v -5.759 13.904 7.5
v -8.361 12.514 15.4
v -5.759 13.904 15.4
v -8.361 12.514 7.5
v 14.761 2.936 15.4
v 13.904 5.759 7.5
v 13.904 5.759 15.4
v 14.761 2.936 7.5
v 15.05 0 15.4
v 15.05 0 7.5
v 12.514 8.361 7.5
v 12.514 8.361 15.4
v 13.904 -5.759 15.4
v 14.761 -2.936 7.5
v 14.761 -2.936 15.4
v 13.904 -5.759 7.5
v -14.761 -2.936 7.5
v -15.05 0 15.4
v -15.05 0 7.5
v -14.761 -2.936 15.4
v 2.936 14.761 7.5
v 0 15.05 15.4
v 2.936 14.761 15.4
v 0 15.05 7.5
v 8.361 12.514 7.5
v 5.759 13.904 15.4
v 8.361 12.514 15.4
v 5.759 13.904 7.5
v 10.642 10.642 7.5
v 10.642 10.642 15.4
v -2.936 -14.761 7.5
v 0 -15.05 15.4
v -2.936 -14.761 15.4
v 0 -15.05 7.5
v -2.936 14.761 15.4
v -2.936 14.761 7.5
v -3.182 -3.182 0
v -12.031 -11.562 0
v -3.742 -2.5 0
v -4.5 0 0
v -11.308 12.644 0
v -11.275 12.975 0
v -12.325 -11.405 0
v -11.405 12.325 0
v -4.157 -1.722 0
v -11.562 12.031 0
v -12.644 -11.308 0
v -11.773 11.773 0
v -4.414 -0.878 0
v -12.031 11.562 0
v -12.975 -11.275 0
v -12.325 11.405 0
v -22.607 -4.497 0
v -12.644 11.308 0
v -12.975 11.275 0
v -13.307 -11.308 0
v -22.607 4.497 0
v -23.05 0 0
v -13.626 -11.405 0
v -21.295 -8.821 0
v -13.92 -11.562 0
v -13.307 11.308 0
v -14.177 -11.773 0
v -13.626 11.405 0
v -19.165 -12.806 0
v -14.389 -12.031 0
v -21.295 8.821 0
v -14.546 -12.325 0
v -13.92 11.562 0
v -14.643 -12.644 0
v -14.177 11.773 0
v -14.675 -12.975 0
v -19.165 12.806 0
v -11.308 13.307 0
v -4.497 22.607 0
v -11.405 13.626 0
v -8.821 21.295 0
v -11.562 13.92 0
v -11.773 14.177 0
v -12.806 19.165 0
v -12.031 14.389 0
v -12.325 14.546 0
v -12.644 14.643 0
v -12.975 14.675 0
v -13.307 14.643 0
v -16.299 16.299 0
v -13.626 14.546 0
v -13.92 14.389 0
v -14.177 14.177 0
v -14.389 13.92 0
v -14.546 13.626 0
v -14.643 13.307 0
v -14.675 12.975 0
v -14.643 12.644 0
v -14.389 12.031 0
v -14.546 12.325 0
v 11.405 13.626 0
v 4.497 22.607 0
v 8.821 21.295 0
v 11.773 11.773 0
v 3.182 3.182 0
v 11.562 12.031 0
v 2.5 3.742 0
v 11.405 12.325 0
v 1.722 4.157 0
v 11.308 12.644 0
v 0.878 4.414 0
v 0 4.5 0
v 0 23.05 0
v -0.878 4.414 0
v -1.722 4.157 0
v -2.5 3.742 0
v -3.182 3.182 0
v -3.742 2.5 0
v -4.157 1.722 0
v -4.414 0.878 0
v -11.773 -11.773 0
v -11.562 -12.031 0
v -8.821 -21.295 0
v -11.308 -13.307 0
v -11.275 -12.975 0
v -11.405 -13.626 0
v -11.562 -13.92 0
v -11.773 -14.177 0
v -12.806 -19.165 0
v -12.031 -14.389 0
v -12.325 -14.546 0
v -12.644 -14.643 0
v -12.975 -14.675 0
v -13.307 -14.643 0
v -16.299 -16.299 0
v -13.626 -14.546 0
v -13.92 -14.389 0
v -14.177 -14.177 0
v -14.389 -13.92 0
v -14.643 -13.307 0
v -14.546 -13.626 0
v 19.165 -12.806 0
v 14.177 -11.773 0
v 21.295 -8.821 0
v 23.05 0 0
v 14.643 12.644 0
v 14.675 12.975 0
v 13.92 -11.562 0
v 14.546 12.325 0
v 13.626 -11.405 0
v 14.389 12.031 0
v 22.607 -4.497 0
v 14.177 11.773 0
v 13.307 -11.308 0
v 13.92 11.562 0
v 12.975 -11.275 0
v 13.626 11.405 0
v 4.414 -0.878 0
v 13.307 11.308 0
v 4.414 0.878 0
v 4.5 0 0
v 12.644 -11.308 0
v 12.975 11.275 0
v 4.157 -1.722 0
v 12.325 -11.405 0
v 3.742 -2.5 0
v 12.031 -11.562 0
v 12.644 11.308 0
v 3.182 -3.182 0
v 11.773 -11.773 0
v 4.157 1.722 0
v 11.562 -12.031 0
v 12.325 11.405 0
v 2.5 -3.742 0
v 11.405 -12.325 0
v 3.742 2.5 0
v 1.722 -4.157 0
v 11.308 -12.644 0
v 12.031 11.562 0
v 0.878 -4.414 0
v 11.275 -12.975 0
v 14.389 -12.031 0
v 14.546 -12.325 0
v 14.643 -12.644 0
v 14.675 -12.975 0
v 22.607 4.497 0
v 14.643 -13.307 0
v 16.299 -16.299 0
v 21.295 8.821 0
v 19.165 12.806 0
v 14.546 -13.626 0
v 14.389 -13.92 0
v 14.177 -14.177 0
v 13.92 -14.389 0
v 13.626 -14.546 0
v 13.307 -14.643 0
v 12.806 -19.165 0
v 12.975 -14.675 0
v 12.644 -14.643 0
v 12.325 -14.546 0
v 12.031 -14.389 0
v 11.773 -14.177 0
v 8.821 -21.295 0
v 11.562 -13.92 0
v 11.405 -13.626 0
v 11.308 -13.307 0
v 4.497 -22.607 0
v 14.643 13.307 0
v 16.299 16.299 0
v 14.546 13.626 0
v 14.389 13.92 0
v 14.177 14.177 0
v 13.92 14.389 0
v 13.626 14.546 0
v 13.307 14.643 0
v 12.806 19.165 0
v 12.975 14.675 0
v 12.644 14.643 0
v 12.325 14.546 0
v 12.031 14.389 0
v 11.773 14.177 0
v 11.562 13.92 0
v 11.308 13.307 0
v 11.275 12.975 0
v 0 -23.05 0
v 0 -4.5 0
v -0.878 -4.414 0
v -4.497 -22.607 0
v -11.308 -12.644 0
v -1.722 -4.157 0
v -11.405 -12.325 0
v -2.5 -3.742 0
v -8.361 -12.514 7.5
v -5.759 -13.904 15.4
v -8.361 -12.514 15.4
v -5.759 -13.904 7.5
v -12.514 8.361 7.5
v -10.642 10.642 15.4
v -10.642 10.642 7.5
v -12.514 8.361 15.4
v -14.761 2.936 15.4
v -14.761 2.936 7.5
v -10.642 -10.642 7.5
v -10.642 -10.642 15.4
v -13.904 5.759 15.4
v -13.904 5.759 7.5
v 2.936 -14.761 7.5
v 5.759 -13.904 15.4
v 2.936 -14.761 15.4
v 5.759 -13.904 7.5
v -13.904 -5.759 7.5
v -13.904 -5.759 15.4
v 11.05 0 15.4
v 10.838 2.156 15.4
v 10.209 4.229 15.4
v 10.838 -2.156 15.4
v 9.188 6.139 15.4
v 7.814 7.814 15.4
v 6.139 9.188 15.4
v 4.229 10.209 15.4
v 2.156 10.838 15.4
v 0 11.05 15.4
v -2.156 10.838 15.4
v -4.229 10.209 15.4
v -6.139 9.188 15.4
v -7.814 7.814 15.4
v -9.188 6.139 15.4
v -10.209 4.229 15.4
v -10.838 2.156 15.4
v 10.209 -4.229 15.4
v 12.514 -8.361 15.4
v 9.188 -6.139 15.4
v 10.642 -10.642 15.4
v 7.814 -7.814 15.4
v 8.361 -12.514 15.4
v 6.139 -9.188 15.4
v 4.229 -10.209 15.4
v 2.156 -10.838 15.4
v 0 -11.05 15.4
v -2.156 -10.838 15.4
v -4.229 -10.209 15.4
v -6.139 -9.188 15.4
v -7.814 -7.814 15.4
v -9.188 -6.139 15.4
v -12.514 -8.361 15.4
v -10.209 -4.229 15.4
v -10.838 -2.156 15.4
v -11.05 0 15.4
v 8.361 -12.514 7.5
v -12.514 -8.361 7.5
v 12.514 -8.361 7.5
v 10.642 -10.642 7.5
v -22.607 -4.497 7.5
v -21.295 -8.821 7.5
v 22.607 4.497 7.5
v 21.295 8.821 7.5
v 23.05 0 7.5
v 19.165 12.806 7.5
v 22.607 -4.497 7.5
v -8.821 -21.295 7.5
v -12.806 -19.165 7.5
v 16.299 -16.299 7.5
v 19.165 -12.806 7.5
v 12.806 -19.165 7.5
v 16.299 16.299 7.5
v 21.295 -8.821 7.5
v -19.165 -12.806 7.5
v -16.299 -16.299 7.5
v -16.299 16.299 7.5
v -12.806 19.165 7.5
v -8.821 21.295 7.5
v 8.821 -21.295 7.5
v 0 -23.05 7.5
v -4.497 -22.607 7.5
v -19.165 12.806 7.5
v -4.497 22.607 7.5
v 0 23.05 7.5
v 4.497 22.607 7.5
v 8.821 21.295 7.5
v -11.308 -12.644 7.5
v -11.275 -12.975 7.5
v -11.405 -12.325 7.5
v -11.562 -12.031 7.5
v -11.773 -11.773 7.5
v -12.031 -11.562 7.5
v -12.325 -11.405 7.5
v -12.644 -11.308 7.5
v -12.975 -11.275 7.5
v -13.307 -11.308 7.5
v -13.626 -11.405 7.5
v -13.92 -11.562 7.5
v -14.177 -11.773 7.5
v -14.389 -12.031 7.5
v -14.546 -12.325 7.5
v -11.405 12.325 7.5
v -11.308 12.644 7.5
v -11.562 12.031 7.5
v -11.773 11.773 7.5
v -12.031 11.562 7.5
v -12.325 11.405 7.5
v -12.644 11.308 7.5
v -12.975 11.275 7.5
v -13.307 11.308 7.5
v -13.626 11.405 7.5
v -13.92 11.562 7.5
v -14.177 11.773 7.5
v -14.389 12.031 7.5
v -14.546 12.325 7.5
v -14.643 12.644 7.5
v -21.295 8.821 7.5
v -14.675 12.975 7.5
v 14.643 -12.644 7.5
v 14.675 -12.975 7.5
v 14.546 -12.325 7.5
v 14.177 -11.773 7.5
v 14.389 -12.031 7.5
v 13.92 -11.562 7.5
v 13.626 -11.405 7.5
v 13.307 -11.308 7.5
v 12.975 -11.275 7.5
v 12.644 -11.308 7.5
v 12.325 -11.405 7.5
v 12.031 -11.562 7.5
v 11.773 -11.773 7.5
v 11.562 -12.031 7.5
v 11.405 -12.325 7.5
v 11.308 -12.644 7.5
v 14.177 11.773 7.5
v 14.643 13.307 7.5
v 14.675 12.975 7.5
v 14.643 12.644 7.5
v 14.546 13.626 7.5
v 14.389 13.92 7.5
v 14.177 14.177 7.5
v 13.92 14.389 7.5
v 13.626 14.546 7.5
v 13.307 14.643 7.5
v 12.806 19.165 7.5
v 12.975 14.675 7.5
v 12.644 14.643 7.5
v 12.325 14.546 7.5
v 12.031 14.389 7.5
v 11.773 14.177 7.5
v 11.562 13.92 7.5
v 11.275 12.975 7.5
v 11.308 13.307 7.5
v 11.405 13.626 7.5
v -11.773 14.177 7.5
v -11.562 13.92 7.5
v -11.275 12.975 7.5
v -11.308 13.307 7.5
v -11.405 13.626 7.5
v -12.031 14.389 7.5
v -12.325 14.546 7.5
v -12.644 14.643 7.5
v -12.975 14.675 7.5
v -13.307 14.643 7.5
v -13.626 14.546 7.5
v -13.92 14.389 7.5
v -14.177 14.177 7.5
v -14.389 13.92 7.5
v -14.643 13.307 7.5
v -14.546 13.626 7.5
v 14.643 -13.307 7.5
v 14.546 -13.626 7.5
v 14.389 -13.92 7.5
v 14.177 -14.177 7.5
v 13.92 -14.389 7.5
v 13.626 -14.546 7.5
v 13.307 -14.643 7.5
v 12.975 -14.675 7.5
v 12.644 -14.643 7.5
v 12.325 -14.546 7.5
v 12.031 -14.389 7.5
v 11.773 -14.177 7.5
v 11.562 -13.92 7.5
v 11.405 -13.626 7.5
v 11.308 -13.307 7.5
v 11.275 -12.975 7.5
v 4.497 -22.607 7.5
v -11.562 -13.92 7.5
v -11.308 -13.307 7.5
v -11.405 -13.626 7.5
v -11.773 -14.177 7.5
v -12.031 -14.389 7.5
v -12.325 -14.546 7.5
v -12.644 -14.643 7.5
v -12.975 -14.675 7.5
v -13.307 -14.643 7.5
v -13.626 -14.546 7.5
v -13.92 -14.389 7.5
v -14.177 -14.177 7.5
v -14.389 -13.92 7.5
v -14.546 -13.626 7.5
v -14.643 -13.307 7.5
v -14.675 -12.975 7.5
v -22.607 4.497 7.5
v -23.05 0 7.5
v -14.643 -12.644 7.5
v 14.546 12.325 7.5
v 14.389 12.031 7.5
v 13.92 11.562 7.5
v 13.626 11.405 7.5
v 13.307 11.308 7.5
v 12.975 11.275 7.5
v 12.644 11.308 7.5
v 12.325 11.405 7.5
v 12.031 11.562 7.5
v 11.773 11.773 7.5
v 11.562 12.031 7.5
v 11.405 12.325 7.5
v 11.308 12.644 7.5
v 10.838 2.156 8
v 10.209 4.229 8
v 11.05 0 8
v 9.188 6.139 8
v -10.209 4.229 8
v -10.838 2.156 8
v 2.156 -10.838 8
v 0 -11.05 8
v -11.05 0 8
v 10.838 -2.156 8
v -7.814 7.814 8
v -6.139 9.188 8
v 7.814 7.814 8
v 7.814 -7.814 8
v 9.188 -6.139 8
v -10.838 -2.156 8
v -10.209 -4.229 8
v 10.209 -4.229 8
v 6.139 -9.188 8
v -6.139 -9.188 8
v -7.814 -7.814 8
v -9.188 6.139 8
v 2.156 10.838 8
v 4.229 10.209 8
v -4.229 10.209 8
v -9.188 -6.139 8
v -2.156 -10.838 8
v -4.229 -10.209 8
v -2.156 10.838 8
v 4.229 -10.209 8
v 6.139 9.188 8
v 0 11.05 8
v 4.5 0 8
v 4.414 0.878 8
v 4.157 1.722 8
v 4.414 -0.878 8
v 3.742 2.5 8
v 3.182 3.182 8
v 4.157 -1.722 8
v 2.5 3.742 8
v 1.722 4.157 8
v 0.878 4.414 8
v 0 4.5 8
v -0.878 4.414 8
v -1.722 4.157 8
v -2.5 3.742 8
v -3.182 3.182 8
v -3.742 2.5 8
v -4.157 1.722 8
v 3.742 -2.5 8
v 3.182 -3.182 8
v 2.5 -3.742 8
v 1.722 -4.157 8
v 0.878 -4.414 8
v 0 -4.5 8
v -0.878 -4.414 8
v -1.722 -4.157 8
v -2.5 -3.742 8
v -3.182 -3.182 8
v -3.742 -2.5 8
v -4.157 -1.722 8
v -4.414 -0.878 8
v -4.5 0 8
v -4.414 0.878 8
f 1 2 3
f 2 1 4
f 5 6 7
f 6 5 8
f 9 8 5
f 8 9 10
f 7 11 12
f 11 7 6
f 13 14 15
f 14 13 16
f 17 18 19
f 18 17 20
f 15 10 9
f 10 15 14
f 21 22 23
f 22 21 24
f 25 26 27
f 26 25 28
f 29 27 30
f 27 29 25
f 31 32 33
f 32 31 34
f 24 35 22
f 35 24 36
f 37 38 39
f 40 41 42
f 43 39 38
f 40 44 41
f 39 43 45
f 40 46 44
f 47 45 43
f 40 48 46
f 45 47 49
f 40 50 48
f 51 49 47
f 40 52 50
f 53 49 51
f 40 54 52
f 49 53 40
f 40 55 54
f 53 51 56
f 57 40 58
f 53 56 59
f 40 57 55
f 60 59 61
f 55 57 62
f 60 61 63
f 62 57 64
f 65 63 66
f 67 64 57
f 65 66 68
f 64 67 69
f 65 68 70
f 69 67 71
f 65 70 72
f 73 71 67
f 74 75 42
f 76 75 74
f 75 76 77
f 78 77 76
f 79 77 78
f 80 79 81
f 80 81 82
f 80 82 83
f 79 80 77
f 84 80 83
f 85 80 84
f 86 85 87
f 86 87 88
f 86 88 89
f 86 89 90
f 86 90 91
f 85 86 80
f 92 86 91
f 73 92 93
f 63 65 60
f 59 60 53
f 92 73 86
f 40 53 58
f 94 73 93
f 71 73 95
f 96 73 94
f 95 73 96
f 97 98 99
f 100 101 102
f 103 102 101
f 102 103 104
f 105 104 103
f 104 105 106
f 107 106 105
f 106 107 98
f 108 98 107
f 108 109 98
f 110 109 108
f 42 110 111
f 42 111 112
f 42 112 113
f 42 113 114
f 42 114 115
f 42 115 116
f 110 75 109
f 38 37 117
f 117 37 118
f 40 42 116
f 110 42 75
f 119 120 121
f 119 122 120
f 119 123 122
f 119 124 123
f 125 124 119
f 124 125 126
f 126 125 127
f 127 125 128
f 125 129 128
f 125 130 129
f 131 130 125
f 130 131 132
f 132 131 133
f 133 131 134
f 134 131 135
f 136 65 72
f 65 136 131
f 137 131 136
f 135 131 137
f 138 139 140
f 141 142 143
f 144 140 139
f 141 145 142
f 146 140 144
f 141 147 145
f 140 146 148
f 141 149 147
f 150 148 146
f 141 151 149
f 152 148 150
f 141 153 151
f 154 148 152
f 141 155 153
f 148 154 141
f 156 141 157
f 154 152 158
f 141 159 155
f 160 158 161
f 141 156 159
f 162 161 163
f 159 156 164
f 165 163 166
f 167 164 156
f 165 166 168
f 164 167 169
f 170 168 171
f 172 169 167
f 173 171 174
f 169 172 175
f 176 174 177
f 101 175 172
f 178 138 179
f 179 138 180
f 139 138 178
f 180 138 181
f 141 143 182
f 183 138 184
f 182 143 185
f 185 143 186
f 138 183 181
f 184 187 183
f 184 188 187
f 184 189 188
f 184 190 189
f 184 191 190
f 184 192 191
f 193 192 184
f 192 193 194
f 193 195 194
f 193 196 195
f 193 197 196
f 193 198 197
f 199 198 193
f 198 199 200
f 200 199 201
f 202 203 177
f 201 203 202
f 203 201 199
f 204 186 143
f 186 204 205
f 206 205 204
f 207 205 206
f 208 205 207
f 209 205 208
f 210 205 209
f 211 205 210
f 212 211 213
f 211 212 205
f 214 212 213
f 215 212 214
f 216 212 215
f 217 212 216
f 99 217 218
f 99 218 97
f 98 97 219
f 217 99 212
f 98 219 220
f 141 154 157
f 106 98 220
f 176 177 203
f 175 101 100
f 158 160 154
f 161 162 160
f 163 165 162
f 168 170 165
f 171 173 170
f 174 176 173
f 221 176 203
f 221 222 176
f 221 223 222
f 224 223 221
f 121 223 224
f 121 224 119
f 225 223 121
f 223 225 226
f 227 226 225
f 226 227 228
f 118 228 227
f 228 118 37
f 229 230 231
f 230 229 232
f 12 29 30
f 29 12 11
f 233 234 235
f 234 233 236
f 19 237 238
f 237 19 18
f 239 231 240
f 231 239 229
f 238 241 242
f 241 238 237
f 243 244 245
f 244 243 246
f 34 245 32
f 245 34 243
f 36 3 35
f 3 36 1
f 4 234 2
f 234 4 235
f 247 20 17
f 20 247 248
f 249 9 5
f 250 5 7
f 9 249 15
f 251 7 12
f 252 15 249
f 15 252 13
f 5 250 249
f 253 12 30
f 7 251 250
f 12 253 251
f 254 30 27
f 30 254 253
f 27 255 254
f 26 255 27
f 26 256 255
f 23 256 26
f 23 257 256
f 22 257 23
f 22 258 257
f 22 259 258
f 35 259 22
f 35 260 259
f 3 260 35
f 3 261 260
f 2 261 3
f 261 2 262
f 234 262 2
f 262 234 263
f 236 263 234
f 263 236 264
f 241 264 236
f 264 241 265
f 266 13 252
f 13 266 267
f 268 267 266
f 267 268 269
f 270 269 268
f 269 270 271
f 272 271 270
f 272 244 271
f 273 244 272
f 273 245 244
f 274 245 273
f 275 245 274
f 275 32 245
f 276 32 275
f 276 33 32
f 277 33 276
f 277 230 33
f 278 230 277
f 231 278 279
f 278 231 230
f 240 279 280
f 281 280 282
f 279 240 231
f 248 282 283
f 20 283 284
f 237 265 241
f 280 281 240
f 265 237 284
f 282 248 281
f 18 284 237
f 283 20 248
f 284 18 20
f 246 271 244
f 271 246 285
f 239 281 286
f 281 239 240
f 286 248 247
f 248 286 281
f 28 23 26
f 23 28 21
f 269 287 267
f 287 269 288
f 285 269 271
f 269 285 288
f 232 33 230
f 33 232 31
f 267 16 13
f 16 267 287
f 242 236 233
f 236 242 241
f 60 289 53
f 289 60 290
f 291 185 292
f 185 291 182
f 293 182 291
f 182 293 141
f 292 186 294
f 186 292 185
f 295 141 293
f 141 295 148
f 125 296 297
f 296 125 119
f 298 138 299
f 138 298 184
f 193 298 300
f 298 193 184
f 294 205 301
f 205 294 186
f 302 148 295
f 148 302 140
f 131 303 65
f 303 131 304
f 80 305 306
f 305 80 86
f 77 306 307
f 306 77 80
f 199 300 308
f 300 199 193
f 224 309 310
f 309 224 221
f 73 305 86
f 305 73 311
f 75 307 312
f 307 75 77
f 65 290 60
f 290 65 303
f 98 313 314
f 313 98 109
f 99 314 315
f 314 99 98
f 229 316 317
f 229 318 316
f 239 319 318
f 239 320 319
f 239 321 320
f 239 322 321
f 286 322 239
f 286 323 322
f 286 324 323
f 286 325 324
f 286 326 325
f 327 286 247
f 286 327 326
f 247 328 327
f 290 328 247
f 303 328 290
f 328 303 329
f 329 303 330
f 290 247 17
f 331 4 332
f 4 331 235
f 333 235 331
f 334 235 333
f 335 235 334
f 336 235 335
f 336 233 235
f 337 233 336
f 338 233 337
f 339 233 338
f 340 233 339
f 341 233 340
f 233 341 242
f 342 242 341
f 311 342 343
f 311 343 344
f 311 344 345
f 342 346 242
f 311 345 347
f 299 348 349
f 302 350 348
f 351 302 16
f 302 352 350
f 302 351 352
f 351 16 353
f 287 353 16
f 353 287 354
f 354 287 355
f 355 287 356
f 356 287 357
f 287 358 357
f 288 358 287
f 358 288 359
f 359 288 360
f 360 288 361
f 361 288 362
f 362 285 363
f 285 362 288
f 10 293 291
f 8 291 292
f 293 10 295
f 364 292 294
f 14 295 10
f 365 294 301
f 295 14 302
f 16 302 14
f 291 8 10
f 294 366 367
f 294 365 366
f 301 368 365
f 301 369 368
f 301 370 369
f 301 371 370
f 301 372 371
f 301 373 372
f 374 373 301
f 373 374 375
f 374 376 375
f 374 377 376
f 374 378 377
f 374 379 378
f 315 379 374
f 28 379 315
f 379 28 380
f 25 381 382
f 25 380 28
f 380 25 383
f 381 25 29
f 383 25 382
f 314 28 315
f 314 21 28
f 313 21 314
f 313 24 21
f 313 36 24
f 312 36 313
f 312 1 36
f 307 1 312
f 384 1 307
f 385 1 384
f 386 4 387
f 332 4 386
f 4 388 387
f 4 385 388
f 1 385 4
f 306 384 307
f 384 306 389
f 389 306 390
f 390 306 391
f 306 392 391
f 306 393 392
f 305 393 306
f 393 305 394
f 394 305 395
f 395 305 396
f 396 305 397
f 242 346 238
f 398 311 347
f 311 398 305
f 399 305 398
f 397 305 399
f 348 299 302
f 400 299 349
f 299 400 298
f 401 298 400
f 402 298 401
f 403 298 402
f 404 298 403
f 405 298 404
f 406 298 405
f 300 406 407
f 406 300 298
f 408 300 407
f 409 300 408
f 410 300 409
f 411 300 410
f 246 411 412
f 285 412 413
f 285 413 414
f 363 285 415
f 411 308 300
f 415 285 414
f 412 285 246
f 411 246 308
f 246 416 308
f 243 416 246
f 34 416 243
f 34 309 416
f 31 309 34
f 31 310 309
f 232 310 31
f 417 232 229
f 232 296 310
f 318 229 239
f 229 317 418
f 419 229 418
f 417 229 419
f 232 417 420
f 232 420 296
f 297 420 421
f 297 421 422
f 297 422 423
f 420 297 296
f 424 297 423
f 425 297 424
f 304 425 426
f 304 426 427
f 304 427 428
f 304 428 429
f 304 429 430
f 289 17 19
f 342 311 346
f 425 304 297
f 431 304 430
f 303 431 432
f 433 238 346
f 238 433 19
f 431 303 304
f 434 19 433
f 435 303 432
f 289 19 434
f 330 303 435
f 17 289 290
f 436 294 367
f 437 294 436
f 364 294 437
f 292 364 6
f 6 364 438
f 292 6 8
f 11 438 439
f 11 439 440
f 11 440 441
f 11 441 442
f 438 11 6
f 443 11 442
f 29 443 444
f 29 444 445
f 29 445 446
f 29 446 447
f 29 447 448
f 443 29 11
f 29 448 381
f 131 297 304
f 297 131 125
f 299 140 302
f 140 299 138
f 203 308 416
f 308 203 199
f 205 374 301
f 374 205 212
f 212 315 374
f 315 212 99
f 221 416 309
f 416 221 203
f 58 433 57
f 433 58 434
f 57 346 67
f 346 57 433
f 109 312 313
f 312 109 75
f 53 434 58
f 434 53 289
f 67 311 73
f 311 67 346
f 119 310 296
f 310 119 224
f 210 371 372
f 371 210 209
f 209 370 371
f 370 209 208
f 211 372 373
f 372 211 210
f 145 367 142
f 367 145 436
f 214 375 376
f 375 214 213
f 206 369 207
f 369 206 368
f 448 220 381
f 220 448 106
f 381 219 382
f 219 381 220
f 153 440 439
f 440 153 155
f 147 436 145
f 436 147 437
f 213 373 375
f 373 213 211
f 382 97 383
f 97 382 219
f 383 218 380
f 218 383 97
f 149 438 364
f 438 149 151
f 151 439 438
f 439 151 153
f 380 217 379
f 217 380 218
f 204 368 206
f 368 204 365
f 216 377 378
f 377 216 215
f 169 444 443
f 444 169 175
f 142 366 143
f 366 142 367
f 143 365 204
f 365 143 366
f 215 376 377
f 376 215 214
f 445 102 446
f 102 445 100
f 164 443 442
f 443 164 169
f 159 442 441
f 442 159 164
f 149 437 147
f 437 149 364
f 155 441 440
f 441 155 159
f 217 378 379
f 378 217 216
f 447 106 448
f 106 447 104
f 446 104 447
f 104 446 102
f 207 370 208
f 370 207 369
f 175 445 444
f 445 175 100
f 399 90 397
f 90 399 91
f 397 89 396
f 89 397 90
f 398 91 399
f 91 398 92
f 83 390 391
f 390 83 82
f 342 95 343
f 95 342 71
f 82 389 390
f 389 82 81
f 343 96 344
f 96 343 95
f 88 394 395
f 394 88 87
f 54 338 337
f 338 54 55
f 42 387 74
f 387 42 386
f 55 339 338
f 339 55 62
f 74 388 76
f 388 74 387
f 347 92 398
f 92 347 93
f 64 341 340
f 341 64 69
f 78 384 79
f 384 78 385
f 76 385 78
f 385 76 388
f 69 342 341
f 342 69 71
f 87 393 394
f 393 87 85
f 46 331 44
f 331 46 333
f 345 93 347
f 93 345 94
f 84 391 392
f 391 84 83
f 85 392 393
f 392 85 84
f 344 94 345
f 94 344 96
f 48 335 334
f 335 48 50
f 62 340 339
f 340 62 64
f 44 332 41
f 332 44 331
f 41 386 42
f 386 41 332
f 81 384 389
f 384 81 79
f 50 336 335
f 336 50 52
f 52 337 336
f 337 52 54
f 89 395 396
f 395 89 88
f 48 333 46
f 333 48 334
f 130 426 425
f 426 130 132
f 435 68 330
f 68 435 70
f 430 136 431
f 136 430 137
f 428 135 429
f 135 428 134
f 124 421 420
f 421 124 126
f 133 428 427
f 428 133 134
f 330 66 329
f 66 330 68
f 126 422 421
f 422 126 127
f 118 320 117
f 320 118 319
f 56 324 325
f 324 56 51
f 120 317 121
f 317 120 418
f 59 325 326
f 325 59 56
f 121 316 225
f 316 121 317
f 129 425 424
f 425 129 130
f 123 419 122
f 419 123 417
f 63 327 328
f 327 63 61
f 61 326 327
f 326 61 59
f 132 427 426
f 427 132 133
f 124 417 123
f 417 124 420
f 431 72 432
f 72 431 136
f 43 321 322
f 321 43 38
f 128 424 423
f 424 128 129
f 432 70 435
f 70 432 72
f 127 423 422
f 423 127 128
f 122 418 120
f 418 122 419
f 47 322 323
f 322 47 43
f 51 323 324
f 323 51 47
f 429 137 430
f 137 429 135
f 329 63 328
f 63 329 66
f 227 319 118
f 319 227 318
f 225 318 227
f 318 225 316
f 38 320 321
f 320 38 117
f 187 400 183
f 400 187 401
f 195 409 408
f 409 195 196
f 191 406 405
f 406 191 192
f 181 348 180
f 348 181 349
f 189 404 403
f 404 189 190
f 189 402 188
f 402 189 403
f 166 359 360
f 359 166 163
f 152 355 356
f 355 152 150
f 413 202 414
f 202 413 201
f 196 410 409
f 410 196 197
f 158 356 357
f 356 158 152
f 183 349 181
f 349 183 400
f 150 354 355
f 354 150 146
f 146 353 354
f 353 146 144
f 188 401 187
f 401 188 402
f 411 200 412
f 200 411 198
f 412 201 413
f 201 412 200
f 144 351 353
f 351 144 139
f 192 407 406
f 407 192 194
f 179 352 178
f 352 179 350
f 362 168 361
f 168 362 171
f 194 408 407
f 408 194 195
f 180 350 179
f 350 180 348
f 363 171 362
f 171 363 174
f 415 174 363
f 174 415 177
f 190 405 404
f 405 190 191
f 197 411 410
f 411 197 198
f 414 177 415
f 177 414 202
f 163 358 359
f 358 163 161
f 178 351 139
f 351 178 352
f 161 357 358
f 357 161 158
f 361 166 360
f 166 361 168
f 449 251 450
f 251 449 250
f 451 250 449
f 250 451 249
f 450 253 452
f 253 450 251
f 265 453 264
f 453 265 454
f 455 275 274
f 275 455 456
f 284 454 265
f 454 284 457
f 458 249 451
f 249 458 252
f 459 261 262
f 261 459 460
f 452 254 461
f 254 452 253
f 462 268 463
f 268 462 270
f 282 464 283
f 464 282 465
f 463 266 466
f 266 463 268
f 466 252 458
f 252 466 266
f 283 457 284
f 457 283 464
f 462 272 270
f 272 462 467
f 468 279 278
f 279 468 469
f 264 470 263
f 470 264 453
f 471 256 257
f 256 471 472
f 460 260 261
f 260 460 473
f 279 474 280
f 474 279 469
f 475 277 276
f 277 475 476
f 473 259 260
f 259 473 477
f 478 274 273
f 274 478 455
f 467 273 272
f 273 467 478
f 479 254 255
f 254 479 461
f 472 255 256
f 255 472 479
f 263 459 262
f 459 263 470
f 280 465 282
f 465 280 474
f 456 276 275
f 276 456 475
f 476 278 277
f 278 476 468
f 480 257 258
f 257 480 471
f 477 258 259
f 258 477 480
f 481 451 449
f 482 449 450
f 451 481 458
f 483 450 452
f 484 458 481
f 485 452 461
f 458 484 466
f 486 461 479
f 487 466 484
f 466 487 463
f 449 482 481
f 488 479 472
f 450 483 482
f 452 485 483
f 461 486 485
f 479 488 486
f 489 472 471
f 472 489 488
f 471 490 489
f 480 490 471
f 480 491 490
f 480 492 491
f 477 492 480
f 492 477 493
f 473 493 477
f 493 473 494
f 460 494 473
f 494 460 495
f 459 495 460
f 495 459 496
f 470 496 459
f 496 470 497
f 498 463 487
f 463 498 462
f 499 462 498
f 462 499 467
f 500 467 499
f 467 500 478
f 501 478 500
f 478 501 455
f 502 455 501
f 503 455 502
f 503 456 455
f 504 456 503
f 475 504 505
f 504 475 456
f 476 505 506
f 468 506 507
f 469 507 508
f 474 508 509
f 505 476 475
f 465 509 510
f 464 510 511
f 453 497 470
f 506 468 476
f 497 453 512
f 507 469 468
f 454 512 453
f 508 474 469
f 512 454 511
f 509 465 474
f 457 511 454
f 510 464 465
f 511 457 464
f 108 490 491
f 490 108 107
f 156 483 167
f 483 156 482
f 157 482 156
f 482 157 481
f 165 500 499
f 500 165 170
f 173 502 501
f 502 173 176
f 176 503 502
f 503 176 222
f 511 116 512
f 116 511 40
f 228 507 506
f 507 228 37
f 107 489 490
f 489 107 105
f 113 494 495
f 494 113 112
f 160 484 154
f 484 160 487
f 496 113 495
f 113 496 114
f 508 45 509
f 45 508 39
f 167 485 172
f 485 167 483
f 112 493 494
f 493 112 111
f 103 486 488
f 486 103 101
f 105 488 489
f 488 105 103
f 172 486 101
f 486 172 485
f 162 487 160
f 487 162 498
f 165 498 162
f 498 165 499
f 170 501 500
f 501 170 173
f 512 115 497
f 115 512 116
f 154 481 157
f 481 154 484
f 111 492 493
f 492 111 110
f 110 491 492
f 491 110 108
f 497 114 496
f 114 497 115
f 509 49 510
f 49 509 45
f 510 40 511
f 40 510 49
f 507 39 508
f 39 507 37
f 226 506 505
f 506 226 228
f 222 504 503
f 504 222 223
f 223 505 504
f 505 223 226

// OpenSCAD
$fn = 32;

// ----------------------------------------------------------------------
// Bearing housing: seat for 608 (22 x 7 mm), 30.1 mm body
// ----------------------------------------------------------------------

// --- parameters (mm) ---
housing_d = 30.1;         // housing outside diameter
housing_h = 15.4;         // overall housing height
wall_t = 4;               // wall thickness
seat_d = 22.1;            // 608 seat, 0.1 mm clearance
seat_h = 7.4;             // pocket depth
shoulder = 2;             // shoulder under the bearing
pass_d = 9;               // shaft passage
flange_d = 46.1;          // mounting flange diameter
flange_t = 6;             // flange thickness
bolt_d = 3.4;             // flange bolt clearance
bolt_r = 18.35;           // flange bolt circle radius

module body() {
  cylinder(h = housing_h, d = housing_d);
}

module flange() {
  /* flange sunk 1.5 mm into the body */
  cylinder(h = flange_t + 1.5, d = flange_d);
}

difference() {
  union() {
    body();
    flange();
  }
  translate([0, 0, housing_h - seat_h]) cylinder(h = seat_h + 1, d = seat_d);
  translate([0, 0, -1]) cylinder(h = housing_h - seat_h + 1, d = pass_d);
  for (i = [0 : 3]) rotate([0, 0, 45 + i * 90]) translate([bolt_r, 0, -1])
    cylinder(h = flange_t + 3, d = bolt_d);
}
